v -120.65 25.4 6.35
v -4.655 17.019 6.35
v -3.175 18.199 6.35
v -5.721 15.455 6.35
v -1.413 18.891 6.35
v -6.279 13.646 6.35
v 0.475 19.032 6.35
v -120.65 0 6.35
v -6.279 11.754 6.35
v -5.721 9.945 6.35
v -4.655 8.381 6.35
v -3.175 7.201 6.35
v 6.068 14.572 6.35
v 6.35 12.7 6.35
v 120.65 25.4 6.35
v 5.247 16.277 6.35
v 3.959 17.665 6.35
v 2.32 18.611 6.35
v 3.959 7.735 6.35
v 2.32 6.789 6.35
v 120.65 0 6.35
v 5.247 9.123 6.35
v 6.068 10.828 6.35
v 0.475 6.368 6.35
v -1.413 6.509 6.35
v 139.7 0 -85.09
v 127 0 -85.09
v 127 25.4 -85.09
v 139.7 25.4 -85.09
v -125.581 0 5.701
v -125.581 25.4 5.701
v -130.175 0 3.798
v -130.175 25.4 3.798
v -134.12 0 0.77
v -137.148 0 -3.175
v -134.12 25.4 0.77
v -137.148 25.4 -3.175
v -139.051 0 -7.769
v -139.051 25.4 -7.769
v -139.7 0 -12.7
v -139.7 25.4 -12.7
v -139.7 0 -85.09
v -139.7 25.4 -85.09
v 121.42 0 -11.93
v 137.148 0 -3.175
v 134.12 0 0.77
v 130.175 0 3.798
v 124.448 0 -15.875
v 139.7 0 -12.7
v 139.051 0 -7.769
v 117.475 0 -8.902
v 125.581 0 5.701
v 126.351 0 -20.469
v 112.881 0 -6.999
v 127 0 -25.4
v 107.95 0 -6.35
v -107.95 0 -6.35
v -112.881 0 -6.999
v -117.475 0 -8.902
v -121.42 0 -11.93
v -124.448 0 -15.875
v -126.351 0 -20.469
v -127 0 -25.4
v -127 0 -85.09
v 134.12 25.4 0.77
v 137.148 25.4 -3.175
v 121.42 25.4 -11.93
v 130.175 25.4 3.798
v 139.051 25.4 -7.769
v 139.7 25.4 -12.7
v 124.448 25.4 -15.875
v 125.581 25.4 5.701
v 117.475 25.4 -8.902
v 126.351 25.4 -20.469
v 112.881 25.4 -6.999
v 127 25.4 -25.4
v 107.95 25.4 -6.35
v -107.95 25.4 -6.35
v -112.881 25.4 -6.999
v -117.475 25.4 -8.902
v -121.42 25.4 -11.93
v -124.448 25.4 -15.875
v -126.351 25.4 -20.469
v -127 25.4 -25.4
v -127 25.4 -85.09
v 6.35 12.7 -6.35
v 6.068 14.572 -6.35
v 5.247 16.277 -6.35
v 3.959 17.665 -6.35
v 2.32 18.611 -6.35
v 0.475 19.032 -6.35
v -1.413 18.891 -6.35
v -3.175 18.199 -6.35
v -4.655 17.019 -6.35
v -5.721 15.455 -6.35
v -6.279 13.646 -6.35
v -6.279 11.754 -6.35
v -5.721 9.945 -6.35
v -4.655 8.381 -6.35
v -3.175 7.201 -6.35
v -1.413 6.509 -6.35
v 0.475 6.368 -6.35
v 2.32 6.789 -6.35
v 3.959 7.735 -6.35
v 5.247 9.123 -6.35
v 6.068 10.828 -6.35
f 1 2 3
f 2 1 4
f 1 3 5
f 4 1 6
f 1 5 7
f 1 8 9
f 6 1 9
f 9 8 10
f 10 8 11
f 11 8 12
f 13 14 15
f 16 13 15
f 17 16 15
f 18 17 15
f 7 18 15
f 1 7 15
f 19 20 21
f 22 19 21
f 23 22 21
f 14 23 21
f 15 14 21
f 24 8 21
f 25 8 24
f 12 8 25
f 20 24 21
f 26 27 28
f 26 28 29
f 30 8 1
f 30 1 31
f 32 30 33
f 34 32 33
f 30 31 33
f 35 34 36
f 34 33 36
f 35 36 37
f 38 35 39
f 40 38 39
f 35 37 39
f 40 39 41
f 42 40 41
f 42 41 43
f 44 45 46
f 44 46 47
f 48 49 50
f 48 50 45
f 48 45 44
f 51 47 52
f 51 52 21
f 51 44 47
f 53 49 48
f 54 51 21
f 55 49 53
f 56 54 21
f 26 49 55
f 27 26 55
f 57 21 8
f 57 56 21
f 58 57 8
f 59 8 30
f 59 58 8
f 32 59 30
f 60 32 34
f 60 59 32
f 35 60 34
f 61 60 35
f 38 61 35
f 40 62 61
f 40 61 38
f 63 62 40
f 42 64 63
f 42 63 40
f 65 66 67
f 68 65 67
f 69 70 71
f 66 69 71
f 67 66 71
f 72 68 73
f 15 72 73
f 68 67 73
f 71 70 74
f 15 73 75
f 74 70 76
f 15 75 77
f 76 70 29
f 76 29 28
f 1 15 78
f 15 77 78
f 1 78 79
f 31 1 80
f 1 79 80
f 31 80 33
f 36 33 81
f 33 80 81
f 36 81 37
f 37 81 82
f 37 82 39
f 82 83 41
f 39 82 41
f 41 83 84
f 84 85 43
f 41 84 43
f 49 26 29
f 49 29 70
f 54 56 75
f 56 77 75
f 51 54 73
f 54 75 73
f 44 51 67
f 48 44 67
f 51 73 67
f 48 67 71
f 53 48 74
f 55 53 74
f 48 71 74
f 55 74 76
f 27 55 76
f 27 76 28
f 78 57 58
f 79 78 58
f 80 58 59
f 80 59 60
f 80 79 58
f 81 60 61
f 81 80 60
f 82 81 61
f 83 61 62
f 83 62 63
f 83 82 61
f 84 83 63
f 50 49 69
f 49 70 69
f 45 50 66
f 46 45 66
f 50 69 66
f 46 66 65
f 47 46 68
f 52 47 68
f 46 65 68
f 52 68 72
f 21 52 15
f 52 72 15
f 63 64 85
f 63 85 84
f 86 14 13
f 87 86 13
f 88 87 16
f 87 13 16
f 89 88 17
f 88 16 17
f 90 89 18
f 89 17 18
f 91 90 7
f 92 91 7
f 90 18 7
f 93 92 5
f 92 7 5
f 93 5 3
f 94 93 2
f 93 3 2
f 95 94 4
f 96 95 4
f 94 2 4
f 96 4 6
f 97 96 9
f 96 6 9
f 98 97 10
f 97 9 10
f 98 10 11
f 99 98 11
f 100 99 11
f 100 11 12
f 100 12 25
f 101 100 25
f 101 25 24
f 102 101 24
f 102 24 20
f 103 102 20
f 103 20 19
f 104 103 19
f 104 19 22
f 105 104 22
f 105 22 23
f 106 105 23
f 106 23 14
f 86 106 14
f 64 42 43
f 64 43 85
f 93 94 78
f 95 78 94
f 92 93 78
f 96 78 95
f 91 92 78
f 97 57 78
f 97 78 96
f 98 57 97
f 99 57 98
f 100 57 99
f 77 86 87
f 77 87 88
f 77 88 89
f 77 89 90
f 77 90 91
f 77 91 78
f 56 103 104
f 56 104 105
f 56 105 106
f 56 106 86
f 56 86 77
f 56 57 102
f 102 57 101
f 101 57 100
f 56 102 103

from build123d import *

# Parameters (mm, degrees)
BOSS_EXTRUDE1_DEPTH = 25.4
SKETCH2_R           = 6.35
CUT_EXTRUDE1_DEPTH  = 169.886126132
FILLET1_R           = 19.05


with BuildPart() as part:
    # Sketch1 → Boss-Extrude1 (new body)
    with BuildSketch(Plane(origin=(0, 0, 0), x_dir=(1, 0, 0), z_dir=(0, 1, 0))):
        Polygon((-127, 6.35), (127, 6.35), (127, 85.09), (139.7, 85.09), (139.7, -6.35), (127, -6.35), (-127, -6.35), (-139.7, -6.35), (-139.7, 85.09), (-127, 85.09), align=None)
    extrude(amount=BOSS_EXTRUDE1_DEPTH)

    # Sketch2 → Cut-Extrude1 (cut, through all)
    with BuildSketch(Plane.XY.offset(6.35)):
        with Locations((0, 12.7)):
            Circle(SKETCH2_R)
    extrude(amount=-CUT_EXTRUDE1_DEPTH, mode=Mode.SUBTRACT)

    # Fillet1
    fillet1_edges = [part.edges().sort_by_distance(p)[0] for p in [
        (-139.7, 12.7, 6.35),
        (-127, 12.7, -6.35),
        (127, 12.7, -6.35),
        (139.7, 12.7, 6.35),
    ]]
    fillet(fillet1_edges, radius=FILLET1_R)


solid = part.part
